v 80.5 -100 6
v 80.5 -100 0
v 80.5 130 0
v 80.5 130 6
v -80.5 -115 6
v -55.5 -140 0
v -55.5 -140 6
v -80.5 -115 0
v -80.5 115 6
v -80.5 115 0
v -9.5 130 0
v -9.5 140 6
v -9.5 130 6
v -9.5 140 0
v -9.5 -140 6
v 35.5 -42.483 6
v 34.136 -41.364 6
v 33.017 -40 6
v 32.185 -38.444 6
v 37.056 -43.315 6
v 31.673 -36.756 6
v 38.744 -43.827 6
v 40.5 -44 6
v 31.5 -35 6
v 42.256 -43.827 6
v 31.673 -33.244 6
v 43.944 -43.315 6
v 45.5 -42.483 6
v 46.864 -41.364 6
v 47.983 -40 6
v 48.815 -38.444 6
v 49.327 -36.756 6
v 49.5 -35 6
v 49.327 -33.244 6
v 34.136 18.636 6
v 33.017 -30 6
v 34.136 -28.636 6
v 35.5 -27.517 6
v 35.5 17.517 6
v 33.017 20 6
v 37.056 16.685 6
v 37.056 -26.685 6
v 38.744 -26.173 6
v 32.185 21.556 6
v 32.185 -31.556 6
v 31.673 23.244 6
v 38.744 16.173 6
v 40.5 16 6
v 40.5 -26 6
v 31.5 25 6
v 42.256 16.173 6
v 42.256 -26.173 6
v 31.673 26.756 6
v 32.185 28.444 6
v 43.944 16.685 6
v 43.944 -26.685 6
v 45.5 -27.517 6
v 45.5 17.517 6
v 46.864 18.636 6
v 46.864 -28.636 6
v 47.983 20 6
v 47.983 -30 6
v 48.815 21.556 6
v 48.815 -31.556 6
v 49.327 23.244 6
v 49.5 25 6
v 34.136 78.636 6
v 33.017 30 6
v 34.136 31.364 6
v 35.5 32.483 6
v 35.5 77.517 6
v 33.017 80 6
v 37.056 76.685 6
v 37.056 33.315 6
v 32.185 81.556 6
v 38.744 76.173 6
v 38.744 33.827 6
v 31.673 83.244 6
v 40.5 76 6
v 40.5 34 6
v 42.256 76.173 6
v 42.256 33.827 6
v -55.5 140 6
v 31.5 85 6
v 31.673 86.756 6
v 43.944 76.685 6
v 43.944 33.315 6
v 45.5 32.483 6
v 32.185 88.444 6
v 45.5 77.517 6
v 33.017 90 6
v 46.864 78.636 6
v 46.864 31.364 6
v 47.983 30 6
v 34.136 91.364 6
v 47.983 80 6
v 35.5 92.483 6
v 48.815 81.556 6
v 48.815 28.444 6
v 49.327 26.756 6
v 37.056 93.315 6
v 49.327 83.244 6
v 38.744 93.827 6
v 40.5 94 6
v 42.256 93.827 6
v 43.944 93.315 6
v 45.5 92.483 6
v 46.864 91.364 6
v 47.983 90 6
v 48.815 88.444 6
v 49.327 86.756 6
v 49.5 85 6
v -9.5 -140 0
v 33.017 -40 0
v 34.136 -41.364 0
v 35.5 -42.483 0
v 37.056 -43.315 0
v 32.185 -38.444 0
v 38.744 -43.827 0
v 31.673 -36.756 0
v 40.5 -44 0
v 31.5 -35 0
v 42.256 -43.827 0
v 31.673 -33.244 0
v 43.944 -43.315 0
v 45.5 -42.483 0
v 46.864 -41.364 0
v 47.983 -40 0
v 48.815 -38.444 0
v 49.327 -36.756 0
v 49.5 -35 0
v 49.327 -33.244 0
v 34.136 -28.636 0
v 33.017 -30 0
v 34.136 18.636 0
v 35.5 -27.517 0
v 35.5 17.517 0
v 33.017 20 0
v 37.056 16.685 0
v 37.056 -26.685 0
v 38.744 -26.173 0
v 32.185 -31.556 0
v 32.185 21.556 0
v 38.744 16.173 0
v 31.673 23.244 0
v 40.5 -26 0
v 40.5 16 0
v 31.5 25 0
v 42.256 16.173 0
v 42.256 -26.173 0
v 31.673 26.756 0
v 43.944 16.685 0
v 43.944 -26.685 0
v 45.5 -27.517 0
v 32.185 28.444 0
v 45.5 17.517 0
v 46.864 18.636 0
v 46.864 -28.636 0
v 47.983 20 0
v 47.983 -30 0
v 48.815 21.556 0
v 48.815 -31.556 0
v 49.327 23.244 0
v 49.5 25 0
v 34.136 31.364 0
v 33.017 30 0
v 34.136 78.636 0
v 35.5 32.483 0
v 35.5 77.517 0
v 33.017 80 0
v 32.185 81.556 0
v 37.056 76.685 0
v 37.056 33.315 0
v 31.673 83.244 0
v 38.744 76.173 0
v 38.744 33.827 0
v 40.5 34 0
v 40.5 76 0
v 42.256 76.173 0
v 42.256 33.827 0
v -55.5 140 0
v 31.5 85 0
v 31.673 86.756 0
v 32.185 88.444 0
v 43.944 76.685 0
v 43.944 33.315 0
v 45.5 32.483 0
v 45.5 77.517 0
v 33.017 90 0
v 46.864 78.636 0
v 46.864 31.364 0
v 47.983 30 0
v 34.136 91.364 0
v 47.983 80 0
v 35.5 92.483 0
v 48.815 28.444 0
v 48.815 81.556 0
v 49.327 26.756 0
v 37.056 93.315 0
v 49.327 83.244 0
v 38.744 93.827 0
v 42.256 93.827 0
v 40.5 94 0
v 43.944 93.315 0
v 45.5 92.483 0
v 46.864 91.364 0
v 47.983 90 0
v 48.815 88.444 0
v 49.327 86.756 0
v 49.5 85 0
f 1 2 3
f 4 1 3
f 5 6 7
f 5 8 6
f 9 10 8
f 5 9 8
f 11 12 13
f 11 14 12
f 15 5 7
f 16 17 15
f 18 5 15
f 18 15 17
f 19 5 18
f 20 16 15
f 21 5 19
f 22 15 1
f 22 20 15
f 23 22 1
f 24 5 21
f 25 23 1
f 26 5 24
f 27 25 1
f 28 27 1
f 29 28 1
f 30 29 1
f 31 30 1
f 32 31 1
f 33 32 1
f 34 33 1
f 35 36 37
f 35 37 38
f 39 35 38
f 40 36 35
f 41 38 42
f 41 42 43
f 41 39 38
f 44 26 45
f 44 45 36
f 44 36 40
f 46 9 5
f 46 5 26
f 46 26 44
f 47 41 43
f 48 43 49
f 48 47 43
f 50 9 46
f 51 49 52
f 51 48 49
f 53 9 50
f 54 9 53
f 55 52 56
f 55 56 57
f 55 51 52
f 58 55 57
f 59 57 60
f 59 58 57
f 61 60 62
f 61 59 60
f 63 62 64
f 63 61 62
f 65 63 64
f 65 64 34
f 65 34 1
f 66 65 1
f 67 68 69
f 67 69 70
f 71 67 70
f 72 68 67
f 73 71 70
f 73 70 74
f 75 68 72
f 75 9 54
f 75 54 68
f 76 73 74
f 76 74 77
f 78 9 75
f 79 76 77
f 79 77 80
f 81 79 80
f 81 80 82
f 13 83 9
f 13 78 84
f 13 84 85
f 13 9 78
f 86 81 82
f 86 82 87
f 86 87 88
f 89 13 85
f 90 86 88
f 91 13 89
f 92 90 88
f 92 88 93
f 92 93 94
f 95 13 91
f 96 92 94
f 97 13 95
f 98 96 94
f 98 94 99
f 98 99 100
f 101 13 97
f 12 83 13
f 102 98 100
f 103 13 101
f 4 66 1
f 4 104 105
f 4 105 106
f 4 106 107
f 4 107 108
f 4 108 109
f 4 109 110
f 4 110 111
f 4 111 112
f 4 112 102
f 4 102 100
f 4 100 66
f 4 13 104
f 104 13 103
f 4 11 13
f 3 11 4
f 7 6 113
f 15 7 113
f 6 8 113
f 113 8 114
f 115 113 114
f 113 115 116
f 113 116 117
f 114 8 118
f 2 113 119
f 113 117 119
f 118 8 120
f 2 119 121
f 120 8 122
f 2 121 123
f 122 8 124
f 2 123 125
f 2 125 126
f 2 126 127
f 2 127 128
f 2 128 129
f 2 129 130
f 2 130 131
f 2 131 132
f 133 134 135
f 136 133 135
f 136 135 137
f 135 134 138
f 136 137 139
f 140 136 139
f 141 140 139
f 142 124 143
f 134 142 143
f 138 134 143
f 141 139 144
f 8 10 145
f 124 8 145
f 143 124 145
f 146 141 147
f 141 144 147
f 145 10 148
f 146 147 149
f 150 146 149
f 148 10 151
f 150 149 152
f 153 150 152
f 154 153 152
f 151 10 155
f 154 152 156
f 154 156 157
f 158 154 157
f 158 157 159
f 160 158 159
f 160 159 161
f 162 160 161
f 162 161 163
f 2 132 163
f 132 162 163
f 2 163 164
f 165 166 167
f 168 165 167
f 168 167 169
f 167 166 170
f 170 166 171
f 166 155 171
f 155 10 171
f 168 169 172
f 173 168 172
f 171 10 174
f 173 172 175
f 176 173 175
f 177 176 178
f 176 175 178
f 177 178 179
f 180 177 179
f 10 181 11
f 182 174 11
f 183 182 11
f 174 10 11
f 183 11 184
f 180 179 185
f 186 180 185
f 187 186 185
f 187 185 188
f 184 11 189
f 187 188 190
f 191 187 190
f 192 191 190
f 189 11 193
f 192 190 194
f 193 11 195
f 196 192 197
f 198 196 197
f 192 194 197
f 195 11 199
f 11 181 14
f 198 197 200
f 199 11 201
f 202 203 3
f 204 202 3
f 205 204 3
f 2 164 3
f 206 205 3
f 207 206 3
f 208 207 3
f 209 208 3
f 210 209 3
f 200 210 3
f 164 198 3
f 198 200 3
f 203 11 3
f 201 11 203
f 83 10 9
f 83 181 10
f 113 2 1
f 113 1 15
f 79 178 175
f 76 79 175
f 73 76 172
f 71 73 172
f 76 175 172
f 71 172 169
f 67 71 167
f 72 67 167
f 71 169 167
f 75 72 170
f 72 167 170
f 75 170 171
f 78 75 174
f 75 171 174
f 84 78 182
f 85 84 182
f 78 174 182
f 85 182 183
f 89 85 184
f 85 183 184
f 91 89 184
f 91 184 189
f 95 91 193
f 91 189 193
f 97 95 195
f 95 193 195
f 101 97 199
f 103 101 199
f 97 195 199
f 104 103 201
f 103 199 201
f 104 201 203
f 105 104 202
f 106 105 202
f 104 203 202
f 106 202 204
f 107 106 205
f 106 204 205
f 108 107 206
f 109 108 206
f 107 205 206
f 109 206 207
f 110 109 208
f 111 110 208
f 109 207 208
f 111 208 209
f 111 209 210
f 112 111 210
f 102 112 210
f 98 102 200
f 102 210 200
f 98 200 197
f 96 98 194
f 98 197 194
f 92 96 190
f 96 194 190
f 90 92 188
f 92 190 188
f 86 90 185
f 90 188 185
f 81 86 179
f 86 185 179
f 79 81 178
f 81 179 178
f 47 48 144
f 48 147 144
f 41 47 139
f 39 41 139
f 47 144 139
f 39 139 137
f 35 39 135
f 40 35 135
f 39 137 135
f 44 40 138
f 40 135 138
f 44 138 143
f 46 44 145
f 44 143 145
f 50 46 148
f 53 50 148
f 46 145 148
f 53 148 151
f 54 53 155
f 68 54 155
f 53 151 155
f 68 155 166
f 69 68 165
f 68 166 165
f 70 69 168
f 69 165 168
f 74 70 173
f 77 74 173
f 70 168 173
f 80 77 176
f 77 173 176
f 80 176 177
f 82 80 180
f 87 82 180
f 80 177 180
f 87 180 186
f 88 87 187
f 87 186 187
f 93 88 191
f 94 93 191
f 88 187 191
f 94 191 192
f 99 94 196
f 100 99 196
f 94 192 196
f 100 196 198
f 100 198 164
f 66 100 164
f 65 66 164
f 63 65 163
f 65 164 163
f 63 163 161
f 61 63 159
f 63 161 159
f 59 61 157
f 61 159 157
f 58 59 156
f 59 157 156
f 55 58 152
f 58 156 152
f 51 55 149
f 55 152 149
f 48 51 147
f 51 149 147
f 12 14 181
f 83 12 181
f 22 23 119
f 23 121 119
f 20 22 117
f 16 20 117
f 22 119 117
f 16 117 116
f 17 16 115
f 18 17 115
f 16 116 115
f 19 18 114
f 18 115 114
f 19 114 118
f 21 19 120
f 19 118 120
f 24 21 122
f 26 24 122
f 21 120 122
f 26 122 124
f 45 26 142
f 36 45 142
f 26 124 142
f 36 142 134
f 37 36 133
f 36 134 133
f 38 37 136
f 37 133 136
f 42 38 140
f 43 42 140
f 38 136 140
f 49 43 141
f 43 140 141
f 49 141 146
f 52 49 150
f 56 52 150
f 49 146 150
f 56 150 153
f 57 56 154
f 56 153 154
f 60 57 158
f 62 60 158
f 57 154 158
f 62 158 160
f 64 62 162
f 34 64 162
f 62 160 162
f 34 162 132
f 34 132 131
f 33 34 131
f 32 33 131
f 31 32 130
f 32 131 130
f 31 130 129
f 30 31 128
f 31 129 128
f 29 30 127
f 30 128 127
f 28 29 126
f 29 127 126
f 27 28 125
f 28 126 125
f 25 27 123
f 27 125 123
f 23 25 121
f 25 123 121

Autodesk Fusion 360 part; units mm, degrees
sketch "スケッチ1" plane through (0, 0, 0) normal (0, 0, 1) x (1, 0, 0)
  line L0 (-9.5, 140) -> (-80.5, 140)
  line L1 (-80.5, 140) -> (-80.5, -140)
  line L2 (-80.5, -140) -> (-9.5, -140)
  line L3 (80.5, -100) -> (80.5, 130)
  line L4 (74.75, 130) -> (-80.5, -140) construction
  line L5 (-80.5, 140) -> (62.1814, -108.1416) construction
  line L6 (-9.5, 140) -> (-9.5, 130)
  line L7 (-9.5, 130) -> (80.5, 130)
  line L8 (-80.5, -140) -> (-9.5, -140) construction
  line L9 (80.5, -100) -> (-9.5, -140)
  dimension "d2" = 280
  dimension "d5" = 71
extrude "押し出し1" add sketch "スケッチ1" along normal blind 6
chamfer "面取り1" distance 25 angle 45 2 edges at (-80.5, -140, 3) (-80.5, 140, 3)
sketch "スケッチ2" plane through (0, 0, 6) normal (0, 0, 1) x (-1, 0, 0)
  line L0 (55.5, -140) -> (80.5, -115)
  line L1 (80.5, -115) -> (80.5, 115)
  line L2 (80.5, 115) -> (55.5, 140)
  line L3 (55.5, 140) -> (9.5, 140)
  line L4 (9.5, 140) -> (-80.5, 100)
  line L5 (-80.5, 100) -> (-80.5, -130)
  line L6 (-80.5, -130) -> (9.5, -130)
  line L7 (9.5, -130) -> (9.5, -140)
  line L8 (9.5, -140) -> (55.5, -140)
  line L9 (-80.5, -130) -> (-40.5, -130) construction
  line L10 (-40.5, -130) -> (-40.5, -85) construction
  line L11 (-40.5, -85) -> (-80.5, -85) construction
  line L12 (-80.5, -85) -> (-80.5, -130) construction
  line L13 (-40.5, -85) -> (-40.5, -25) construction
  line L14 (-40.5, -25) -> (-40.5, 35) construction
  point P0 (-40.5, -85)
  point P1 (-40.5, -25)
  point P2 (-40.5, 35)
  dimension "d10" = 40
  dimension "d11" = 45
  dimension "d12" = 60
  dimension "d13" = 60
hole "穴1" at (40.5, 85, 6) at (40.5, 25, 6) at (40.5, -35, 6) direction (0, 0, -1) diameter 18 end through all
equation "d5 = 25 mm + 46 mm"
